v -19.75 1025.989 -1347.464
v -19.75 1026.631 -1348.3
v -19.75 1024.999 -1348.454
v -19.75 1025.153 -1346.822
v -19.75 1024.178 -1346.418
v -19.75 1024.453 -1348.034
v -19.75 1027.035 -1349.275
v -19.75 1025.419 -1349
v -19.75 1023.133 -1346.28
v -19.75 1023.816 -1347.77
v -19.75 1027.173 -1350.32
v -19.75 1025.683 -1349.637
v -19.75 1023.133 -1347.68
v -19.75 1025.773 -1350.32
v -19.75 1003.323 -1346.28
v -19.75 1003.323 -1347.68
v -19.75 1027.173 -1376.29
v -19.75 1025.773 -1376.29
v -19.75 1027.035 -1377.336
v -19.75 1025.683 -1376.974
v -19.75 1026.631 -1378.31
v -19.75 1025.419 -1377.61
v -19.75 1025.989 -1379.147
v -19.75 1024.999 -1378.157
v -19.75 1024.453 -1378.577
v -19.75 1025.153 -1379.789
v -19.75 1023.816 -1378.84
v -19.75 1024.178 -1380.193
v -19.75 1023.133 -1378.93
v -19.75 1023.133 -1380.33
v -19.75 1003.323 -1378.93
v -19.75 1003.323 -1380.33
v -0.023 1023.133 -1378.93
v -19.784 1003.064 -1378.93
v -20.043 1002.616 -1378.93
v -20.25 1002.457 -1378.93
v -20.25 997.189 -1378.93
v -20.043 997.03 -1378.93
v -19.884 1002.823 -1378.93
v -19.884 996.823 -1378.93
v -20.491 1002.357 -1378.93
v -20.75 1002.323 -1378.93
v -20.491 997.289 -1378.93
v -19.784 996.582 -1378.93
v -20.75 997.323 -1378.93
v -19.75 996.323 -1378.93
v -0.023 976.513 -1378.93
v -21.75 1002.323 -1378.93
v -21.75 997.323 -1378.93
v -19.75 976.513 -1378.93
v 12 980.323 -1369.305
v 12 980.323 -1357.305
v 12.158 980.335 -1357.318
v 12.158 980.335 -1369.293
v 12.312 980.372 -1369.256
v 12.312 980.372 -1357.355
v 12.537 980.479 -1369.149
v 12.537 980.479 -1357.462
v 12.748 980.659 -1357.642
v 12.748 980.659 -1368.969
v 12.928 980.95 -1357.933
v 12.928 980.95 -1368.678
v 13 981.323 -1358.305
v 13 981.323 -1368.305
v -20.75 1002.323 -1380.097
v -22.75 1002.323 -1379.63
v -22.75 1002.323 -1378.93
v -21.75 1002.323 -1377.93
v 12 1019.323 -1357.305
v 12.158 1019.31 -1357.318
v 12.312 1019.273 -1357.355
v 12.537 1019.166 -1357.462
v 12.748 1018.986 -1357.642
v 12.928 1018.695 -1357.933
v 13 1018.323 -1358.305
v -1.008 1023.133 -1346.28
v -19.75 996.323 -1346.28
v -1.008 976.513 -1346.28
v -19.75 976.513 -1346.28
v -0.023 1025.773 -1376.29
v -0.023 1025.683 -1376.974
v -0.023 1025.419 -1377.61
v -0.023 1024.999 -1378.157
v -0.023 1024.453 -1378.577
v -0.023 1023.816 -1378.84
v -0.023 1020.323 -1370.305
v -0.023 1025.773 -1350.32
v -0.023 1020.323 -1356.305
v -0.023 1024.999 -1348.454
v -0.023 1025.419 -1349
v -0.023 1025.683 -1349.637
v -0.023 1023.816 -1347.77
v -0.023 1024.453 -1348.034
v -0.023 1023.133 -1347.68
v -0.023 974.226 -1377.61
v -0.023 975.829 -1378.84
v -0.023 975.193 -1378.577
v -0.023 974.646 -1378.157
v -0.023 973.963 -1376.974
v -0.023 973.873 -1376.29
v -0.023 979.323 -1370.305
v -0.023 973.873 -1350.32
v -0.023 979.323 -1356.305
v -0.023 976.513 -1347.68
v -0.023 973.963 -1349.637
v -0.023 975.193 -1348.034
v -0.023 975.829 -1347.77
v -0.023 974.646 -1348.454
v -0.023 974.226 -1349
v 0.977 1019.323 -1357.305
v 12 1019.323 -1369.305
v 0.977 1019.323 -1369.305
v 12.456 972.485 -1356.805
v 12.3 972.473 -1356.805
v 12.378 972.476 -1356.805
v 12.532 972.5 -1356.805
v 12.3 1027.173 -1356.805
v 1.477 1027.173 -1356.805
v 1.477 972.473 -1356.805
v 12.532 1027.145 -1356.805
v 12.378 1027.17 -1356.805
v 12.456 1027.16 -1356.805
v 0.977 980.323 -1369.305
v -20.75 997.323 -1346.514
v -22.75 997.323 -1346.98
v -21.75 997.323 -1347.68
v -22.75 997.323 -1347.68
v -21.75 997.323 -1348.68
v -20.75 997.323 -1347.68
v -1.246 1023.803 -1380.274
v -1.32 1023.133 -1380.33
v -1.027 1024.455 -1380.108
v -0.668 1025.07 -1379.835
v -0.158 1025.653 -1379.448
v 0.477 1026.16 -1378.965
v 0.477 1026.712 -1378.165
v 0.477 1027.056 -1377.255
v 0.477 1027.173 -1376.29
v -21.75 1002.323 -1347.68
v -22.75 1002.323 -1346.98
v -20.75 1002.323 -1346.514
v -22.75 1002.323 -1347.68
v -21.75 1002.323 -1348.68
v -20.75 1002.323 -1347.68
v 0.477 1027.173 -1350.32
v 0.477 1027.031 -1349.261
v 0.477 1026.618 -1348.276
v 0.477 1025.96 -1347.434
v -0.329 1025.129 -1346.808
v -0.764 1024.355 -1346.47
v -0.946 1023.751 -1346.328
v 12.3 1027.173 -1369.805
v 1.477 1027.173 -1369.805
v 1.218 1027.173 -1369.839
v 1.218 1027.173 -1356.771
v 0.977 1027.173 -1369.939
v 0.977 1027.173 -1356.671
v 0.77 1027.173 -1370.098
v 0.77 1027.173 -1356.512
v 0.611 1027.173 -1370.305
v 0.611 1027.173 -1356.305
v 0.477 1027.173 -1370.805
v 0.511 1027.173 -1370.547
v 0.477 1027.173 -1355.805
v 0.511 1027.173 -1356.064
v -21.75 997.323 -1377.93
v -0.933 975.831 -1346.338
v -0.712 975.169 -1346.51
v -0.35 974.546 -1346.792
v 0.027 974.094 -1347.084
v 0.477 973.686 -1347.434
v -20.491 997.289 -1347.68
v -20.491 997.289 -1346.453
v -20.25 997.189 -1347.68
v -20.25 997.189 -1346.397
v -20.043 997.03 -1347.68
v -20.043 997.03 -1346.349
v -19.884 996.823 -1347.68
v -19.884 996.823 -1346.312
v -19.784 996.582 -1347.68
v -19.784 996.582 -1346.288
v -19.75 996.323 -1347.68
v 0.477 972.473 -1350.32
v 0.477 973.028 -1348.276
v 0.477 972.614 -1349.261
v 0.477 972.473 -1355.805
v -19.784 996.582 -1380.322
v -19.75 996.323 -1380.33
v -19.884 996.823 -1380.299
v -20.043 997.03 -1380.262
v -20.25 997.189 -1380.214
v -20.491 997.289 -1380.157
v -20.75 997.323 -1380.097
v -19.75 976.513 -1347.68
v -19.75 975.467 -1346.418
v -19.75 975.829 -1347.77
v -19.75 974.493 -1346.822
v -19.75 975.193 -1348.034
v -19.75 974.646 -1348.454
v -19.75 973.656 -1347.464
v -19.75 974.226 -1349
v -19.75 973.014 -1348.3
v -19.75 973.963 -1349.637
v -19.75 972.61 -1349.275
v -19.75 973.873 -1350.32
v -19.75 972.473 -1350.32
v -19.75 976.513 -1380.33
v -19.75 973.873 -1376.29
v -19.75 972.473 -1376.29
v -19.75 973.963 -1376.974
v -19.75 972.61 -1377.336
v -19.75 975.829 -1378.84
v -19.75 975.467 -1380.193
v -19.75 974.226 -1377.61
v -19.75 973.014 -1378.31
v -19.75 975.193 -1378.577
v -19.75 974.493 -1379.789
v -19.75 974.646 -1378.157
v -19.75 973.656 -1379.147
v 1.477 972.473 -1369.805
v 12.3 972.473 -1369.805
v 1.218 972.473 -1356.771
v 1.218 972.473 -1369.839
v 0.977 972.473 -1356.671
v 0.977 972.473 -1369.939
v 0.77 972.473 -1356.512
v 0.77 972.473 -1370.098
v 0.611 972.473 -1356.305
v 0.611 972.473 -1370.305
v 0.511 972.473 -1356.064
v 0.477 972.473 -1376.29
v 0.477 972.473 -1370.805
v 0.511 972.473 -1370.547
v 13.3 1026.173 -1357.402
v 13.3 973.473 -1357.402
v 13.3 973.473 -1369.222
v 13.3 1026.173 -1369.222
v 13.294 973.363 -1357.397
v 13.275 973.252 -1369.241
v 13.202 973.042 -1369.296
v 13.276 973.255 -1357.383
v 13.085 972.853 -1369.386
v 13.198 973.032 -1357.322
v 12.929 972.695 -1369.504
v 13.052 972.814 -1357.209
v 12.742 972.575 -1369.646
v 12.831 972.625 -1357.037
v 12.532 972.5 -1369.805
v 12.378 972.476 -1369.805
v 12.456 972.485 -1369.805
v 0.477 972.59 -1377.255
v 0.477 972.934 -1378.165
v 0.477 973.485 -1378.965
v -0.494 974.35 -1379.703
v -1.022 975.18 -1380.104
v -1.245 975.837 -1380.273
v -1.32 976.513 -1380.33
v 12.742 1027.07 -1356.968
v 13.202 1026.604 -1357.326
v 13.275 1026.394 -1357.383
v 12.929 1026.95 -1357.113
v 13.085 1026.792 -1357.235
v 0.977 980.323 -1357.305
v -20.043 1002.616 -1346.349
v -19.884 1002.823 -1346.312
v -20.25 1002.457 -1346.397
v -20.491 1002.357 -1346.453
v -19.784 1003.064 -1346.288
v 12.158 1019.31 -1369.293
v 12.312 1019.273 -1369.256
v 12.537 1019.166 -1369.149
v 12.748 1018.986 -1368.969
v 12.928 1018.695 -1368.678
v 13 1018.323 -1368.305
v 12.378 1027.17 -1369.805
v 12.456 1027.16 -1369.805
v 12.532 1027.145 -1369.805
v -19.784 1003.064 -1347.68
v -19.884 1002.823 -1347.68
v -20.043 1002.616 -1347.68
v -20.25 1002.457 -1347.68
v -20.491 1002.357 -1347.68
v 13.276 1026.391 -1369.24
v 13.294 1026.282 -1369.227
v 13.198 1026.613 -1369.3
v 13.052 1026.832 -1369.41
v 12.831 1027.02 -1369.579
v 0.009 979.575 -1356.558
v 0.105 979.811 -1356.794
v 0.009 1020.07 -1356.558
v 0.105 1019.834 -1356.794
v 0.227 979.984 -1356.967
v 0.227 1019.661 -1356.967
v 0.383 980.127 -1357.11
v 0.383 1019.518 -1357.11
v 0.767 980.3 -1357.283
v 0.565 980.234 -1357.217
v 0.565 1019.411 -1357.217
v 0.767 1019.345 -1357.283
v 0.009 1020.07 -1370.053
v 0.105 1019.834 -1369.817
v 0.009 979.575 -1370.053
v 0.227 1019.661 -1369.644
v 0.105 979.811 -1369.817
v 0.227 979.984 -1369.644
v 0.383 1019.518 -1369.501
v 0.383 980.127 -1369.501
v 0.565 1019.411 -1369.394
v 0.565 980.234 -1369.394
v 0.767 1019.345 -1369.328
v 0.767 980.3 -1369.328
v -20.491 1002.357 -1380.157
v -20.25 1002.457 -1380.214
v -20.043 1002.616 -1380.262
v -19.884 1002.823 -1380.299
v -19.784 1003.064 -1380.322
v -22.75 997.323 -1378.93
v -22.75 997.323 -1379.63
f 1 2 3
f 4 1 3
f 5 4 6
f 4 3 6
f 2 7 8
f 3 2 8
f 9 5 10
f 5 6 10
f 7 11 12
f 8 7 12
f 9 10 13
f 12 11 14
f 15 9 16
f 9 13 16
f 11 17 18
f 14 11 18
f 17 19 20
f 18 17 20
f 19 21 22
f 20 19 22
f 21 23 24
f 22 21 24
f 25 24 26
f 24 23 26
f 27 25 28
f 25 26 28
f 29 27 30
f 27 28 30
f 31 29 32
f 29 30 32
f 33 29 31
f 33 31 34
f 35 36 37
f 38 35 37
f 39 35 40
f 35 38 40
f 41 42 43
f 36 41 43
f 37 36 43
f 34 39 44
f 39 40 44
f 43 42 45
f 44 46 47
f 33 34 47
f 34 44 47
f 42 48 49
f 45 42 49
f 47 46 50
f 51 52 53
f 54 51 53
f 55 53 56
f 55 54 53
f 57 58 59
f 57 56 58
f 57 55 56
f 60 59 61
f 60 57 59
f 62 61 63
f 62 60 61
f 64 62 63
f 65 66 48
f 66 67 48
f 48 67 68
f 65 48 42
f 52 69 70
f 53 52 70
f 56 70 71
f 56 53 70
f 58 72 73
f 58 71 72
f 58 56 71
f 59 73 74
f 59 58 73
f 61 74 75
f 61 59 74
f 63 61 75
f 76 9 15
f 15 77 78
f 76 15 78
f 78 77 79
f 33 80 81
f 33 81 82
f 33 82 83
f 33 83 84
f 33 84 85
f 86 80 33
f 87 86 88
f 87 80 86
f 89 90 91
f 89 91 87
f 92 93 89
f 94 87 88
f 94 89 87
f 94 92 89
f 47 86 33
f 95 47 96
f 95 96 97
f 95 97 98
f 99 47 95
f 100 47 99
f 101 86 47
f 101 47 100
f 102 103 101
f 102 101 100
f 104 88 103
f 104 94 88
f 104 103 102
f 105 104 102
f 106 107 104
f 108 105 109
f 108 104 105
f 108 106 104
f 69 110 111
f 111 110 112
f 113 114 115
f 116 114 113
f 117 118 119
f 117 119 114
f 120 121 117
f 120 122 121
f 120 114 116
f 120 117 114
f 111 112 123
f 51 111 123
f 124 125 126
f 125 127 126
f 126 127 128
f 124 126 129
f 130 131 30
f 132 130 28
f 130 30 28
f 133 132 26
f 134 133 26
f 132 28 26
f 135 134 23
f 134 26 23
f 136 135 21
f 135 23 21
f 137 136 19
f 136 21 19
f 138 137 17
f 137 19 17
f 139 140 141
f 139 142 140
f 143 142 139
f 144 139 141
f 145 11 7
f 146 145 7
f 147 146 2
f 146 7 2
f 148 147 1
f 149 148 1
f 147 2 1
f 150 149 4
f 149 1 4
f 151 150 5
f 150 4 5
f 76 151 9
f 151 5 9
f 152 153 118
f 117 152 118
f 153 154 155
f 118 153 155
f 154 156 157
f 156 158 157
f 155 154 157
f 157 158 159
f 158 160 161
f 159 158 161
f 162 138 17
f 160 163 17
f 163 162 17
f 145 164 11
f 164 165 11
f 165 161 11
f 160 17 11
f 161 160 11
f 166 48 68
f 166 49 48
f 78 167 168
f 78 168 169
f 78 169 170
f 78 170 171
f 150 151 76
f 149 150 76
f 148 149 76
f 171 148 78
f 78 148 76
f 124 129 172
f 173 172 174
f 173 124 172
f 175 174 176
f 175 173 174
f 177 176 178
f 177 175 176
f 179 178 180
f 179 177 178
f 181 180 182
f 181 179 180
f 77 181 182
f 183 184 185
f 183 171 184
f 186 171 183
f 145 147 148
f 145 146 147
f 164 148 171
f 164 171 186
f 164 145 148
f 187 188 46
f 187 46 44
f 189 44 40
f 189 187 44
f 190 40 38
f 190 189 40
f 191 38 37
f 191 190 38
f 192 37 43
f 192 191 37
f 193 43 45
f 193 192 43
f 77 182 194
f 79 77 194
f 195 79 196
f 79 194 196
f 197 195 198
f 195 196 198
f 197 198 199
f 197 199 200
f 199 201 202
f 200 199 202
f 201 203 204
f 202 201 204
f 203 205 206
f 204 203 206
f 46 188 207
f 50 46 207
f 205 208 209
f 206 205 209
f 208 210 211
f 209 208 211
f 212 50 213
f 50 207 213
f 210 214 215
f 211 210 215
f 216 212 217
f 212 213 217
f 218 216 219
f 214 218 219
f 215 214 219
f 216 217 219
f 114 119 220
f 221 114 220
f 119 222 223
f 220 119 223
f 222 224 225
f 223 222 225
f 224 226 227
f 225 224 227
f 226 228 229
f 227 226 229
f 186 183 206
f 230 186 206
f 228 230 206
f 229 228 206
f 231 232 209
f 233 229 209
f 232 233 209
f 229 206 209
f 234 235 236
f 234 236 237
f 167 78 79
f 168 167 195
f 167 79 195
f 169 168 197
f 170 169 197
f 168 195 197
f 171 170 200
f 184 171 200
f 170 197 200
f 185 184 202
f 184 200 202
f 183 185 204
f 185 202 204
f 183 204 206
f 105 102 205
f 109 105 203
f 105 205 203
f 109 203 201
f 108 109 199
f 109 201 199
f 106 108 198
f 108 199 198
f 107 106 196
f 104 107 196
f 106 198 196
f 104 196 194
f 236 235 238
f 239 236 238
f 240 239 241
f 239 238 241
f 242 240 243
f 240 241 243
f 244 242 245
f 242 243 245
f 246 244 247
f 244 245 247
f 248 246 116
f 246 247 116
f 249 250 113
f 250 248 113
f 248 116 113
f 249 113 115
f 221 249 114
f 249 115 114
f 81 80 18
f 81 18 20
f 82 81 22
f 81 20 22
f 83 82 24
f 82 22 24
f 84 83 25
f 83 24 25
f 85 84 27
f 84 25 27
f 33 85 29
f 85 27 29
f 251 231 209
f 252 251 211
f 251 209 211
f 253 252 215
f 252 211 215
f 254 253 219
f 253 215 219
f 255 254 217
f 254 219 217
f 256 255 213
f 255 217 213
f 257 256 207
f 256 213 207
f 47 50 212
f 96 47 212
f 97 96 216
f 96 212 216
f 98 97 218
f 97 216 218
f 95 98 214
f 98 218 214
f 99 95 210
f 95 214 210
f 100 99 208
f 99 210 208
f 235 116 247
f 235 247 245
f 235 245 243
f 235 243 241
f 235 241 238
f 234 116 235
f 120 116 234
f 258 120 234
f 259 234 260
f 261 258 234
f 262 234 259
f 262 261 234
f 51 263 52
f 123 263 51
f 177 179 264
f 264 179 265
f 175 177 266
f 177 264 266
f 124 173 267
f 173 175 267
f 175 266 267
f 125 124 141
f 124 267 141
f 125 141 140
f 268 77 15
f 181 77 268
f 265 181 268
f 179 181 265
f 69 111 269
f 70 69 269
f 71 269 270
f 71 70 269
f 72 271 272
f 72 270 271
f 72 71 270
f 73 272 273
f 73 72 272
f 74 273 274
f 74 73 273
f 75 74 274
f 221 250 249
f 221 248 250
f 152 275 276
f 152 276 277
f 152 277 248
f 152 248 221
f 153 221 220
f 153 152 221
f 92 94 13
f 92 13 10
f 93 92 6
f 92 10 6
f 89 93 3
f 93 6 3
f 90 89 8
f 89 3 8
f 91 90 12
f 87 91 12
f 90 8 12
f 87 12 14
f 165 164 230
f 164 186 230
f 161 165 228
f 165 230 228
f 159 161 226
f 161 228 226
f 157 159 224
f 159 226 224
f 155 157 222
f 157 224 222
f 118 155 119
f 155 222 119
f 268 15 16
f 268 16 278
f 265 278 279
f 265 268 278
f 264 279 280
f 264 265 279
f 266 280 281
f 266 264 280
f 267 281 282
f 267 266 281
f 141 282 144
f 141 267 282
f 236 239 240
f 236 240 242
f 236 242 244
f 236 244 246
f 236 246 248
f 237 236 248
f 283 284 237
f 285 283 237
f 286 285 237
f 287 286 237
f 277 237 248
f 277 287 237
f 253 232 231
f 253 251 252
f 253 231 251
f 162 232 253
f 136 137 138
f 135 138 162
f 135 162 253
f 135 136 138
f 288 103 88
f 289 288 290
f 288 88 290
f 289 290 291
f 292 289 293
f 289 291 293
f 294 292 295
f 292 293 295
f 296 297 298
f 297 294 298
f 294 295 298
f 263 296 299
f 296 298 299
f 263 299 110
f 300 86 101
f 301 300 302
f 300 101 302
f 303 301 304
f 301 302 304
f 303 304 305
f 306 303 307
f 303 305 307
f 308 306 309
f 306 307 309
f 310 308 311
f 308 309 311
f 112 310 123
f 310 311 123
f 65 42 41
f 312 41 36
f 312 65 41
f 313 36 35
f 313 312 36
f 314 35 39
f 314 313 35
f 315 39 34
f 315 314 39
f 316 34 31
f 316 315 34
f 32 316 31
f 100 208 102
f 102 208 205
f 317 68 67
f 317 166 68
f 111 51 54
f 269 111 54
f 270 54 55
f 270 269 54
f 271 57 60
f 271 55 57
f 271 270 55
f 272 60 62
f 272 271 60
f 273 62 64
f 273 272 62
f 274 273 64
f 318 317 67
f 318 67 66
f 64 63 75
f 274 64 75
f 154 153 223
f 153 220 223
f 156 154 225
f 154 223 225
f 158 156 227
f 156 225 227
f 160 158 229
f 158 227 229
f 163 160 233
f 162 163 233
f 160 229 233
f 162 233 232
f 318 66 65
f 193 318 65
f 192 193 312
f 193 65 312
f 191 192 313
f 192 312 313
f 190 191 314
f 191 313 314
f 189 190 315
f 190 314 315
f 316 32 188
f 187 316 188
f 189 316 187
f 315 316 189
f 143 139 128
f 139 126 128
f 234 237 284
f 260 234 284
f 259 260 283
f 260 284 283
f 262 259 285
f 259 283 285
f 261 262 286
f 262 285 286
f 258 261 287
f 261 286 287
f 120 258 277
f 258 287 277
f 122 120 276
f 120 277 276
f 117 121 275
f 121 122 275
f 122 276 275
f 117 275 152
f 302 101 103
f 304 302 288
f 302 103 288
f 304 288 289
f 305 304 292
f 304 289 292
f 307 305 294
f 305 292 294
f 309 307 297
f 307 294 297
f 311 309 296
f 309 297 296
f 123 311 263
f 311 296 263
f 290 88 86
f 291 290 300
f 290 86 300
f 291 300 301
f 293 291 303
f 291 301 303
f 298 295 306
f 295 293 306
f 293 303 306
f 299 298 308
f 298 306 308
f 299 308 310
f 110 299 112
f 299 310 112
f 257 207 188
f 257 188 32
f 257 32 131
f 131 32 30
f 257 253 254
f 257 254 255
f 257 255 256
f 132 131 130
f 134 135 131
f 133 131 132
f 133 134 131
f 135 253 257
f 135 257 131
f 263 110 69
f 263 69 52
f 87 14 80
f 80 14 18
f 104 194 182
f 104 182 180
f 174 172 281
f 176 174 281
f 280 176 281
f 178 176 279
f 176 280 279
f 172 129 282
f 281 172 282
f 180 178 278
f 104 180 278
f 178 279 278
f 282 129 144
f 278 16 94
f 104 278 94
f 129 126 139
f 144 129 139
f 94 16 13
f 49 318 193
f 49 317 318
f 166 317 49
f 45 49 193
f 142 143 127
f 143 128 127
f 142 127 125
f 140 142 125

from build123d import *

# Parameters (mm, degrees)
BOSS_EXTRUDE2_DEPTH      = 13
BOSS_EXTRUDE2_DEPTH_BACK = 19.75
SKETCH2_W                = 39
SKETCH2_H                = 12
BOSS_EXTRUDE3_DEPTH      = 0.3
CUT_EXTRUDE1_DEPTH       = 19.727
CLIP_EDGE_DEPTH          = 2.5
FILLET1_R                = 1
CUT_EXTRUDE2_DEPTH       = 1382.6010589
FILLET2_R                = 1


with BuildPart() as part:
    # Sketch2 → Boss-Extrude2 (new, two sides: drawn at the far end of the back side and taken through both)
    with BuildSketch(Plane(origin=(0, 0, 0), x_dir=(0, -1, 0), z_dir=(1, 0, 0)).offset(-BOSS_EXTRUDE2_DEPTH_BACK)):
        with BuildLine():
            Line((-1027.172700071, 1376.290334899), (-1027.172700071, 1350.320334899))
            ThreePointArc((-1027.172700071, 1350.320334899), (-1025.989411467, 1347.463623503), (-1023.132700071, 1346.280334899))
            Line((-1023.132700071, 1346.280334899), (-976.512700071, 1346.280334899))
            ThreePointArc((-976.512700071, 1346.280334899), (-973.655988675, 1347.463623503), (-972.472700071, 1350.320334899))
            Line((-972.472700071, 1350.320334899), (-972.472700071, 1376.290334899))
            ThreePointArc((-972.472700071, 1376.290334899), (-973.655988675, 1379.147046295), (-976.512700071, 1380.330334899))
            Line((-976.512700071, 1380.330334899), (-1023.132700071, 1380.330334899))
            ThreePointArc((-1023.132700071, 1380.330334899), (-1025.989411467, 1379.147046295), (-1027.172700071, 1376.290334899))
        make_face()
        with Locations((-999.822700071, 1363.305334899)):
            Rectangle(SKETCH2_W, SKETCH2_H, mode=Mode.SUBTRACT)
    extrude(amount=BOSS_EXTRUDE2_DEPTH + BOSS_EXTRUDE2_DEPTH_BACK)

    # Sketch3 → Boss-Extrude3 (add)
    with BuildSketch(Plane.YZ.offset(13)):
        with BuildLine():
            Line((972.472700071, -1350.320334899), (972.472700071, -1376.290334899))
            ThreePointArc((972.472700071, -1376.290334899), (973.655988675, -1379.147046295), (976.512700071, -1380.330334899))
            Line((976.512700071, -1380.330334899), (1023.132700071, -1380.330334899))
            ThreePointArc((1023.132700071, -1380.330334899), (1025.989411467, -1379.147046295), (1027.172700071, -1376.290334899))
            Line((1027.172700071, -1376.290334899), (1027.172700071, -1350.320334899))
            ThreePointArc((1027.172700071, -1350.320334899), (1025.989411467, -1347.463623503), (1023.132700071, -1346.280334899))
            Line((1023.132700071, -1346.280334899), (976.512700071, -1346.280334899))
            ThreePointArc((976.512700071, -1346.280334899), (973.655988675, -1347.463623503), (972.472700071, -1350.320334899))
        make_face()
    extrude(amount=BOSS_EXTRUDE3_DEPTH)

    # Sketch6 → Cut-Extrude1 (cut)
    with BuildSketch(Plane(origin=(-19.75, 0, 0), x_dir=(0, -1, 0), z_dir=(-1, 0, 0))):
        with BuildLine():
            Line((-1025.772700071, -1350.320334899), (-1025.772700071, -1376.290334899))
            ThreePointArc((-1025.772700071, -1376.290334899), (-1024.999461974, -1378.157096801), (-1023.132700071, -1378.930334899))
            Line((-1023.132700071, -1378.930334899), (-976.512700071, -1378.930334899))
            ThreePointArc((-976.512700071, -1378.930334899), (-974.645938169, -1378.157096801), (-973.872700071, -1376.290334899))
            Line((-973.872700071, -1376.290334899), (-973.872700071, -1350.320334899))
            ThreePointArc((-973.872700071, -1350.320334899), (-974.645938169, -1348.453572996), (-976.512700071, -1347.680334899))
            Line((-976.512700071, -1347.680334899), (-1023.132700071, -1347.680334899))
            ThreePointArc((-1023.132700071, -1347.680334899), (-1024.999461974, -1348.453572996), (-1025.772700071, -1350.320334899))
        make_face()
    extrude(amount=-CUT_EXTRUDE1_DEPTH, mode=Mode.SUBTRACT)

    # Sketch10 → Clip Edge (add, symmetric)
    with BuildSketch(Plane(origin=(0, 999.822700071, 0), x_dir=(-1, 0, 0), z_dir=(0, -1, 0))):
        Polygon((19.75, 1346.280334899), (19.75, 1347.680334899), (21.75, 1347.680334899), (21.75, 1348.680334899), (22.75, 1347.680334899), (22.75, 1346.980334899), align=None)
    clip_edge = extrude(amount=CLIP_EDGE_DEPTH, both=True)

    # Mirror1: Clip Edge across plane
    add(clip_edge.mirror(Plane(origin=(0, 0, -1363.305334899), x_dir=(1, 0, 0), z_dir=(0, 0, -1))))

    # Fillet1
    # the kernel refuses this fillet: 1 mm, written as the material it adds along each edge
    with BuildSketch(Plane(origin=(-19.75, 1002.322700071, -1346.280334899), x_dir=(0, 1, 0), z_dir=(0, 0, -1))) as fillet1_piece_1_section:
        with BuildLine():
            CenterArc((FILLET1_R, -FILLET1_R), FILLET1_R, 90, 90)
            Line((0, -FILLET1_R), (0, 0))
            Line((0, 0), (FILLET1_R, 0))
        make_face()
    fillet1_piece_1 = extrude(amount=1.4, mode=Mode.PRIVATE)
    fillet1_piece_1 = split(fillet1_piece_1, bisect_by=Plane(origin=(-20.117660962, 1002.553814872, -1346.366122456), z_dir=(0.22722961560622243, 0, -0.973841209741839)), keep=Keep.TOP, mode=Mode.PRIVATE)
    add(fillet1_piece_1)
    with BuildSketch(Plane(origin=(-19.75, 997.322700071, -1346.280334899), x_dir=(0, -1, 0), z_dir=(0, 0, -1))) as fillet1_piece_2_section:
        with BuildLine():
            CenterArc((FILLET1_R, FILLET1_R), FILLET1_R, 180, 90)
            Line((0, FILLET1_R), (0, 0))
            Line((0, 0), (FILLET1_R, 0))
        make_face()
    fillet1_piece_2 = extrude(amount=1.4, mode=Mode.PRIVATE)
    fillet1_piece_2 = split(fillet1_piece_2, bisect_by=Plane(origin=(-20.117660962, 997.091585271, -1346.366122456), z_dir=(0.22722961560622243, 0, -0.973841209741839)), keep=Keep.TOP, mode=Mode.PRIVATE)
    add(fillet1_piece_2)
    with BuildSketch(Plane(origin=(-19.75, 997.322700071, -1380.330334899), x_dir=(0, -1, 0), z_dir=(0, 0, 1))) as fillet1_piece_3_section:
        with BuildLine():
            CenterArc((FILLET1_R, -FILLET1_R), FILLET1_R, 90, 90)
            Line((0, -FILLET1_R), (0, 0))
            Line((0, 0), (FILLET1_R, 0))
        make_face()
    fillet1_piece_3 = extrude(amount=1.4, mode=Mode.PRIVATE)
    fillet1_piece_3 = split(fillet1_piece_3, bisect_by=Plane(origin=(-20.117660962, 997.091585271, -1380.244547341), z_dir=(0.22722961560622243, 0, 0.973841209741839)), keep=Keep.TOP, mode=Mode.PRIVATE)
    add(fillet1_piece_3)
    with BuildSketch(Plane(origin=(-19.75, 1002.322700071, -1380.330334899), x_dir=(0, 1, 0), z_dir=(0, 0, 1))) as fillet1_piece_4_section:
        with BuildLine():
            CenterArc((FILLET1_R, FILLET1_R), FILLET1_R, 180, 90)
            Line((0, FILLET1_R), (0, 0))
            Line((0, 0), (FILLET1_R, 0))
        make_face()
    fillet1_piece_4 = extrude(amount=1.4, mode=Mode.PRIVATE)
    fillet1_piece_4 = split(fillet1_piece_4, bisect_by=Plane(origin=(-20.117660962, 1002.553814872, -1380.244547341), z_dir=(0.22722961560622243, 0, 0.973841209741839)), keep=Keep.TOP, mode=Mode.PRIVATE)
    add(fillet1_piece_4)
    with BuildSketch(Plane(origin=(13, 1021.822700071, -1369.305334899), x_dir=(-1, 0, 0), z_dir=(0, -1, 0)), Plane(origin=(13, 977.822700071, -1357.305334899), x_dir=(-1, 0, 0), z_dir=(0, 1, 0))) as fillet1_piece_5:
        with BuildLine():
            CenterArc((FILLET1_R, -FILLET1_R), FILLET1_R, 90, 90)
            Line((0, -FILLET1_R), (0, 0))
            Line((0, 0), (FILLET1_R, 0))
        make_face()
    extrude(amount=44)
    with BuildSketch(Plane(origin=(13, 1019.322700071, -1354.805334899), x_dir=(-1, 0, 0), z_dir=(0, 0, -1)), Plane(origin=(13, 980.322700071, -1371.805334899), x_dir=(-1, 0, 0), z_dir=(0, 0, 1))) as fillet1_piece_6:
        with BuildLine():
            CenterArc((FILLET1_R, -FILLET1_R), FILLET1_R, 90, 90)
            Line((0, -FILLET1_R), (0, 0))
            Line((0, 0), (FILLET1_R, 0))
        make_face()
    extrude(amount=17)
    # the kernel refuses this fillet: 1 mm, written as the material it takes off along each edge
    with BuildSketch(Plane(origin=(13.3, 976.512700071, -1350.320334899), x_dir=(0, 0, 1), z_dir=(0, 1, 0))) as fillet1_2_piece_1:
        with BuildLine():
            CenterArc((4.04 - FILLET1_R, -FILLET1_R), FILLET1_R, 0, 90)
            Line((4.04 - FILLET1_R, 0), (4.04, 0))
            Line((4.04, 0), (4.04, -FILLET1_R))
        make_face()
    revolve(axis=Axis((13.3, 976.512700071, -1350.320334899), (1, 0, 0)), revolution_arc=90, mode=Mode.SUBTRACT)
    with BuildSketch(Plane(origin=(13.3, 972.472700071, -1350.320334899), x_dir=(-1, 0, 0), z_dir=(0, 0, -1)), Plane(origin=(13.3, 1027.172700071, -1376.290334899), x_dir=(-1, 0, 0), z_dir=(0, 0, 1))) as fillet1_2_piece_2:
        with BuildLine():
            CenterArc((FILLET1_R, FILLET1_R), FILLET1_R, 180, 90)
            Line((0, FILLET1_R), (0, 0))
            Line((0, 0), (FILLET1_R, 0))
        make_face()
    extrude(amount=25.97, mode=Mode.SUBTRACT)
    with BuildSketch(Plane(origin=(13.3, 976.512700071, -1376.290334899), x_dir=(0, -1, 0), z_dir=(0, 0, 1))) as fillet1_2_piece_3:
        with BuildLine():
            CenterArc((4.04 - FILLET1_R, -FILLET1_R), FILLET1_R, 0, 90)
            Line((4.04 - FILLET1_R, 0), (4.04, 0))
            Line((4.04, 0), (4.04, -FILLET1_R))
        make_face()
    revolve(axis=Axis((13.3, 976.512700071, -1376.290334899), (1, 0, 0)), revolution_arc=90, mode=Mode.SUBTRACT)
    with BuildSketch(Plane(origin=(13.3, 976.512700071, -1380.330334899), x_dir=(-1, 0, 0), z_dir=(0, 1, 0)), Plane(origin=(13.3, 1023.132700071, -1346.280334899), x_dir=(-1, 0, 0), z_dir=(0, -1, 0))) as fillet1_2_piece_4:
        with BuildLine():
            CenterArc((FILLET1_R, FILLET1_R), FILLET1_R, 180, 90)
            Line((0, FILLET1_R), (0, 0))
            Line((0, 0), (FILLET1_R, 0))
        make_face()
    extrude(amount=46.62, mode=Mode.SUBTRACT)
    with BuildSketch(Plane(origin=(13.3, 1023.132700071, -1376.290334899), x_dir=(0, 0, -1), z_dir=(0, -1, 0))) as fillet1_2_piece_5:
        with BuildLine():
            CenterArc((4.04 - FILLET1_R, -FILLET1_R), FILLET1_R, 0, 90)
            Line((4.04, -FILLET1_R), (4.04, 0))
            Line((4.04, 0), (4.04 - FILLET1_R, 0))
        make_face()
    revolve(axis=Axis((13.3, 1023.132700071, -1376.290334899), (1, 0, 0)), revolution_arc=90, mode=Mode.SUBTRACT)
    with BuildSketch(Plane(origin=(13.3, 1023.132700071, -1350.320334899), x_dir=(0, 1, 0), z_dir=(0, 0, -1))) as fillet1_2_piece_6:
        with BuildLine():
            CenterArc((4.04 - FILLET1_R, -FILLET1_R), FILLET1_R, 0, 90)
            Line((4.04 - FILLET1_R, 0), (4.04, 0))
            Line((4.04, 0), (4.04, -FILLET1_R))
        make_face()
    revolve(axis=Axis((13.3, 1023.132700071, -1350.320334899), (1, 0, 0)), revolution_arc=90, mode=Mode.SUBTRACT)
    with BuildSketch(Plane(origin=(-0.023, 1019.322700071, -1369.305334899), x_dir=(0, 1, 0), z_dir=(0, 0, 1)), Plane(origin=(-0.023, 980.322700071, -1357.305334899), x_dir=(0, -1, 0), z_dir=(0, 0, -1))) as fillet1_2_piece_7:
        with BuildLine():
            CenterArc((FILLET1_R, -FILLET1_R), FILLET1_R, 90, 90)
            Line((0, -FILLET1_R), (0, 0))
            Line((0, 0), (FILLET1_R, 0))
        make_face()
    extrude(amount=12, mode=Mode.SUBTRACT)
    with BuildSketch(Plane(origin=(-0.023, 980.322700071, -1369.305334899), x_dir=(0, 0, -1), z_dir=(0, 1, 0)), Plane(origin=(-0.023, 1019.322700071, -1357.305334899), x_dir=(0, 0, 1), z_dir=(0, -1, 0))) as fillet1_2_piece_8:
        with BuildLine():
            CenterArc((FILLET1_R, -FILLET1_R), FILLET1_R, 90, 90)
            Line((0, -FILLET1_R), (0, 0))
            Line((0, 0), (FILLET1_R, 0))
        make_face()
    extrude(amount=39, mode=Mode.SUBTRACT)
    with BuildSketch(Plane(origin=(-0.023, 1019.322700071, -1371.805334899), x_dir=(0, 1, 0), z_dir=(0, 0, 1))) as fillet1_2_piece_9a_section:
        with BuildLine():
            CenterArc((FILLET1_R, -FILLET1_R), FILLET1_R, 90, 90)
            Line((0, -FILLET1_R), (0, 0))
            Line((0, 0), (FILLET1_R, 0))
        make_face()
    fillet1_2_piece_9a = extrude(amount=14.5, mode=Mode.PRIVATE)
    fillet1_2_piece_9a = split(fillet1_2_piece_9a, bisect_by=Plane(origin=(0.203395114, 1019.549095185, -1369.305334899), z_dir=(0, 0, -1)), keep=Keep.TOP, mode=Mode.PRIVATE)
    with BuildSketch(Plane(origin=(-0.023, 980.322700071, -1369.305334899), x_dir=(0, 0, -1), z_dir=(0, 1, 0))) as fillet1_2_piece_9b_section:
        with BuildLine():
            CenterArc((FILLET1_R, -FILLET1_R), FILLET1_R, 90, 90)
            Line((0, -FILLET1_R), (0, 0))
            Line((0, 0), (FILLET1_R, 0))
        make_face()
    fillet1_2_piece_9b = extrude(amount=41.5, mode=Mode.PRIVATE)
    fillet1_2_piece_9b = split(fillet1_2_piece_9b, bisect_by=Plane(origin=(0.203395114, 1019.322700071, -1369.531730013), z_dir=(0, 1, 0)), keep=Keep.TOP, mode=Mode.PRIVATE)
    fillet1_2_piece_9 = fillet1_2_piece_9a & fillet1_2_piece_9b
    add(fillet1_2_piece_9, mode=Mode.SUBTRACT)
    with BuildSketch(Plane(origin=(-0.023, 1021.822700071, -1357.305334899), x_dir=(0, 0, 1), z_dir=(0, -1, 0))) as fillet1_2_piece_10a_section:
        with BuildLine():
            CenterArc((FILLET1_R, -FILLET1_R), FILLET1_R, 90, 90)
            Line((0, -FILLET1_R), (0, 0))
            Line((0, 0), (FILLET1_R, 0))
        make_face()
    fillet1_2_piece_10a = extrude(amount=41.5, mode=Mode.PRIVATE)
    fillet1_2_piece_10a = split(fillet1_2_piece_10a, bisect_by=Plane(origin=(0.203395114, 1019.322700071, -1357.078939784), z_dir=(0, 1, 0)), keep=Keep.TOP, mode=Mode.PRIVATE)
    with BuildSketch(Plane(origin=(-0.023, 1019.322700071, -1369.305334899), x_dir=(0, 1, 0), z_dir=(0, 0, 1))) as fillet1_2_piece_10b_section:
        with BuildLine():
            CenterArc((FILLET1_R, -FILLET1_R), FILLET1_R, 90, 90)
            Line((0, -FILLET1_R), (0, 0))
            Line((0, 0), (FILLET1_R, 0))
        make_face()
    fillet1_2_piece_10b = extrude(amount=14.5, mode=Mode.PRIVATE)
    fillet1_2_piece_10b = split(fillet1_2_piece_10b, bisect_by=Plane(origin=(0.203395114, 1019.549095185, -1357.305334899), z_dir=(0, 0, 1)), keep=Keep.TOP, mode=Mode.PRIVATE)
    fillet1_2_piece_10 = fillet1_2_piece_10a & fillet1_2_piece_10b
    add(fillet1_2_piece_10, mode=Mode.SUBTRACT)
    with BuildSketch(Plane(origin=(-0.023, 980.322700071, -1357.305334899), x_dir=(0, -1, 0), z_dir=(0, 0, -1))) as fillet1_2_piece_11a_section:
        with BuildLine():
            CenterArc((FILLET1_R, -FILLET1_R), FILLET1_R, 90, 90)
            Line((0, -FILLET1_R), (0, 0))
            Line((0, 0), (FILLET1_R, 0))
        make_face()
    fillet1_2_piece_11a = extrude(amount=14.5, mode=Mode.PRIVATE)
    fillet1_2_piece_11a = split(fillet1_2_piece_11a, bisect_by=Plane(origin=(0.203395114, 980.096304957, -1369.305334899), z_dir=(0, 0, -1)), keep=Keep.TOP, mode=Mode.PRIVATE)
    with BuildSketch(Plane(origin=(-0.023, 977.822700071, -1369.305334899), x_dir=(0, 0, -1), z_dir=(0, 1, 0))) as fillet1_2_piece_11b_section:
        with BuildLine():
            CenterArc((FILLET1_R, -FILLET1_R), FILLET1_R, 90, 90)
            Line((0, -FILLET1_R), (0, 0))
            Line((0, 0), (FILLET1_R, 0))
        make_face()
    fillet1_2_piece_11b = extrude(amount=41.5, mode=Mode.PRIVATE)
    fillet1_2_piece_11b = split(fillet1_2_piece_11b, bisect_by=Plane(origin=(0.203395114, 980.322700071, -1369.531730013), z_dir=(0, -1, 0)), keep=Keep.TOP, mode=Mode.PRIVATE)
    fillet1_2_piece_11 = fillet1_2_piece_11a & fillet1_2_piece_11b
    add(fillet1_2_piece_11, mode=Mode.SUBTRACT)
    with BuildSketch(Plane(origin=(-0.023, 980.322700071, -1354.805334899), x_dir=(0, -1, 0), z_dir=(0, 0, -1))) as fillet1_2_piece_12a_section:
        with BuildLine():
            CenterArc((FILLET1_R, -FILLET1_R), FILLET1_R, 90, 90)
            Line((0, -FILLET1_R), (0, 0))
            Line((0, 0), (FILLET1_R, 0))
        make_face()
    fillet1_2_piece_12a = extrude(amount=14.5, mode=Mode.PRIVATE)
    fillet1_2_piece_12a = split(fillet1_2_piece_12a, bisect_by=Plane(origin=(0.203395114, 980.096304957, -1357.305334899), z_dir=(0, 0, 1)), keep=Keep.TOP, mode=Mode.PRIVATE)
    with BuildSketch(Plane(origin=(-0.023, 1019.322700071, -1357.305334899), x_dir=(0, 0, 1), z_dir=(0, -1, 0))) as fillet1_2_piece_12b_section:
        with BuildLine():
            CenterArc((FILLET1_R, -FILLET1_R), FILLET1_R, 90, 90)
            Line((0, -FILLET1_R), (0, 0))
            Line((0, 0), (FILLET1_R, 0))
        make_face()
    fillet1_2_piece_12b = extrude(amount=41.5, mode=Mode.PRIVATE)
    fillet1_2_piece_12b = split(fillet1_2_piece_12b, bisect_by=Plane(origin=(0.203395114, 980.322700071, -1357.078939784), z_dir=(0, -1, 0)), keep=Keep.TOP, mode=Mode.PRIVATE)
    fillet1_2_piece_12 = fillet1_2_piece_12a & fillet1_2_piece_12b
    add(fillet1_2_piece_12, mode=Mode.SUBTRACT)

    # Sketch11 → Cut-Extrude2 (cut, through all)
    with BuildSketch(Plane(origin=(0, 1027.172700071, 0), x_dir=(-1, 0, 0), z_dir=(0, 1, 0))):
        with BuildLine():
            Line((-13.3, -1357.401935688), (-13.3, -1350.320334899))
            Line((-13.3, -1350.320334899), (-13.3, -1347.280334899))
            ThreePointArc((-13.3, -1347.280334899), (-13.007106781, -1346.573228118), (-12.3, -1346.280334899))
            Line((-12.3, -1346.280334899), (1.007680047, -1346.280334899))
            Line((1.007680047, -1346.280334899), (-0.477, -1347.434401717))
            Line((-0.477, -1347.434401717), (-0.477, -1356.805334899))
            Line((-0.477, -1356.805334899), (-12.532486997, -1356.805334899))
            Line((-12.532486997, -1356.805334899), (-13.3, -1357.401935688))
        make_face()
        with BuildLine():
            Line((-12.532486997, -1369.805334899), (-0.477, -1369.805334899))
            Line((-0.477, -1369.805334899), (-0.477, -1378.965184901))
            Line((-0.477, -1378.965184901), (1.319704973, -1380.330334899))
            Line((1.319704973, -1380.330334899), (-12.3, -1380.330334899))
            ThreePointArc((-12.3, -1380.330334899), (-13.007106781, -1380.03744168), (-13.3, -1379.330334899))
            Line((-13.3, -1379.330334899), (-13.3, -1369.222172727))
            Line((-13.3, -1369.222172727), (-12.532486997, -1369.805334899))
        make_face()
    extrude(amount=-CUT_EXTRUDE2_DEPTH, mode=Mode.SUBTRACT)

    # Fillet2
    fillet2_edges = [part.edges().sort_by_distance(p)[0] for p in [
        (0.477, 999.822700071, -1369.805334899),
        (0.477, 999.822700071, -1356.805334899),
    ]]
    fillet(fillet2_edges, radius=FILLET2_R)


solid = part.part
